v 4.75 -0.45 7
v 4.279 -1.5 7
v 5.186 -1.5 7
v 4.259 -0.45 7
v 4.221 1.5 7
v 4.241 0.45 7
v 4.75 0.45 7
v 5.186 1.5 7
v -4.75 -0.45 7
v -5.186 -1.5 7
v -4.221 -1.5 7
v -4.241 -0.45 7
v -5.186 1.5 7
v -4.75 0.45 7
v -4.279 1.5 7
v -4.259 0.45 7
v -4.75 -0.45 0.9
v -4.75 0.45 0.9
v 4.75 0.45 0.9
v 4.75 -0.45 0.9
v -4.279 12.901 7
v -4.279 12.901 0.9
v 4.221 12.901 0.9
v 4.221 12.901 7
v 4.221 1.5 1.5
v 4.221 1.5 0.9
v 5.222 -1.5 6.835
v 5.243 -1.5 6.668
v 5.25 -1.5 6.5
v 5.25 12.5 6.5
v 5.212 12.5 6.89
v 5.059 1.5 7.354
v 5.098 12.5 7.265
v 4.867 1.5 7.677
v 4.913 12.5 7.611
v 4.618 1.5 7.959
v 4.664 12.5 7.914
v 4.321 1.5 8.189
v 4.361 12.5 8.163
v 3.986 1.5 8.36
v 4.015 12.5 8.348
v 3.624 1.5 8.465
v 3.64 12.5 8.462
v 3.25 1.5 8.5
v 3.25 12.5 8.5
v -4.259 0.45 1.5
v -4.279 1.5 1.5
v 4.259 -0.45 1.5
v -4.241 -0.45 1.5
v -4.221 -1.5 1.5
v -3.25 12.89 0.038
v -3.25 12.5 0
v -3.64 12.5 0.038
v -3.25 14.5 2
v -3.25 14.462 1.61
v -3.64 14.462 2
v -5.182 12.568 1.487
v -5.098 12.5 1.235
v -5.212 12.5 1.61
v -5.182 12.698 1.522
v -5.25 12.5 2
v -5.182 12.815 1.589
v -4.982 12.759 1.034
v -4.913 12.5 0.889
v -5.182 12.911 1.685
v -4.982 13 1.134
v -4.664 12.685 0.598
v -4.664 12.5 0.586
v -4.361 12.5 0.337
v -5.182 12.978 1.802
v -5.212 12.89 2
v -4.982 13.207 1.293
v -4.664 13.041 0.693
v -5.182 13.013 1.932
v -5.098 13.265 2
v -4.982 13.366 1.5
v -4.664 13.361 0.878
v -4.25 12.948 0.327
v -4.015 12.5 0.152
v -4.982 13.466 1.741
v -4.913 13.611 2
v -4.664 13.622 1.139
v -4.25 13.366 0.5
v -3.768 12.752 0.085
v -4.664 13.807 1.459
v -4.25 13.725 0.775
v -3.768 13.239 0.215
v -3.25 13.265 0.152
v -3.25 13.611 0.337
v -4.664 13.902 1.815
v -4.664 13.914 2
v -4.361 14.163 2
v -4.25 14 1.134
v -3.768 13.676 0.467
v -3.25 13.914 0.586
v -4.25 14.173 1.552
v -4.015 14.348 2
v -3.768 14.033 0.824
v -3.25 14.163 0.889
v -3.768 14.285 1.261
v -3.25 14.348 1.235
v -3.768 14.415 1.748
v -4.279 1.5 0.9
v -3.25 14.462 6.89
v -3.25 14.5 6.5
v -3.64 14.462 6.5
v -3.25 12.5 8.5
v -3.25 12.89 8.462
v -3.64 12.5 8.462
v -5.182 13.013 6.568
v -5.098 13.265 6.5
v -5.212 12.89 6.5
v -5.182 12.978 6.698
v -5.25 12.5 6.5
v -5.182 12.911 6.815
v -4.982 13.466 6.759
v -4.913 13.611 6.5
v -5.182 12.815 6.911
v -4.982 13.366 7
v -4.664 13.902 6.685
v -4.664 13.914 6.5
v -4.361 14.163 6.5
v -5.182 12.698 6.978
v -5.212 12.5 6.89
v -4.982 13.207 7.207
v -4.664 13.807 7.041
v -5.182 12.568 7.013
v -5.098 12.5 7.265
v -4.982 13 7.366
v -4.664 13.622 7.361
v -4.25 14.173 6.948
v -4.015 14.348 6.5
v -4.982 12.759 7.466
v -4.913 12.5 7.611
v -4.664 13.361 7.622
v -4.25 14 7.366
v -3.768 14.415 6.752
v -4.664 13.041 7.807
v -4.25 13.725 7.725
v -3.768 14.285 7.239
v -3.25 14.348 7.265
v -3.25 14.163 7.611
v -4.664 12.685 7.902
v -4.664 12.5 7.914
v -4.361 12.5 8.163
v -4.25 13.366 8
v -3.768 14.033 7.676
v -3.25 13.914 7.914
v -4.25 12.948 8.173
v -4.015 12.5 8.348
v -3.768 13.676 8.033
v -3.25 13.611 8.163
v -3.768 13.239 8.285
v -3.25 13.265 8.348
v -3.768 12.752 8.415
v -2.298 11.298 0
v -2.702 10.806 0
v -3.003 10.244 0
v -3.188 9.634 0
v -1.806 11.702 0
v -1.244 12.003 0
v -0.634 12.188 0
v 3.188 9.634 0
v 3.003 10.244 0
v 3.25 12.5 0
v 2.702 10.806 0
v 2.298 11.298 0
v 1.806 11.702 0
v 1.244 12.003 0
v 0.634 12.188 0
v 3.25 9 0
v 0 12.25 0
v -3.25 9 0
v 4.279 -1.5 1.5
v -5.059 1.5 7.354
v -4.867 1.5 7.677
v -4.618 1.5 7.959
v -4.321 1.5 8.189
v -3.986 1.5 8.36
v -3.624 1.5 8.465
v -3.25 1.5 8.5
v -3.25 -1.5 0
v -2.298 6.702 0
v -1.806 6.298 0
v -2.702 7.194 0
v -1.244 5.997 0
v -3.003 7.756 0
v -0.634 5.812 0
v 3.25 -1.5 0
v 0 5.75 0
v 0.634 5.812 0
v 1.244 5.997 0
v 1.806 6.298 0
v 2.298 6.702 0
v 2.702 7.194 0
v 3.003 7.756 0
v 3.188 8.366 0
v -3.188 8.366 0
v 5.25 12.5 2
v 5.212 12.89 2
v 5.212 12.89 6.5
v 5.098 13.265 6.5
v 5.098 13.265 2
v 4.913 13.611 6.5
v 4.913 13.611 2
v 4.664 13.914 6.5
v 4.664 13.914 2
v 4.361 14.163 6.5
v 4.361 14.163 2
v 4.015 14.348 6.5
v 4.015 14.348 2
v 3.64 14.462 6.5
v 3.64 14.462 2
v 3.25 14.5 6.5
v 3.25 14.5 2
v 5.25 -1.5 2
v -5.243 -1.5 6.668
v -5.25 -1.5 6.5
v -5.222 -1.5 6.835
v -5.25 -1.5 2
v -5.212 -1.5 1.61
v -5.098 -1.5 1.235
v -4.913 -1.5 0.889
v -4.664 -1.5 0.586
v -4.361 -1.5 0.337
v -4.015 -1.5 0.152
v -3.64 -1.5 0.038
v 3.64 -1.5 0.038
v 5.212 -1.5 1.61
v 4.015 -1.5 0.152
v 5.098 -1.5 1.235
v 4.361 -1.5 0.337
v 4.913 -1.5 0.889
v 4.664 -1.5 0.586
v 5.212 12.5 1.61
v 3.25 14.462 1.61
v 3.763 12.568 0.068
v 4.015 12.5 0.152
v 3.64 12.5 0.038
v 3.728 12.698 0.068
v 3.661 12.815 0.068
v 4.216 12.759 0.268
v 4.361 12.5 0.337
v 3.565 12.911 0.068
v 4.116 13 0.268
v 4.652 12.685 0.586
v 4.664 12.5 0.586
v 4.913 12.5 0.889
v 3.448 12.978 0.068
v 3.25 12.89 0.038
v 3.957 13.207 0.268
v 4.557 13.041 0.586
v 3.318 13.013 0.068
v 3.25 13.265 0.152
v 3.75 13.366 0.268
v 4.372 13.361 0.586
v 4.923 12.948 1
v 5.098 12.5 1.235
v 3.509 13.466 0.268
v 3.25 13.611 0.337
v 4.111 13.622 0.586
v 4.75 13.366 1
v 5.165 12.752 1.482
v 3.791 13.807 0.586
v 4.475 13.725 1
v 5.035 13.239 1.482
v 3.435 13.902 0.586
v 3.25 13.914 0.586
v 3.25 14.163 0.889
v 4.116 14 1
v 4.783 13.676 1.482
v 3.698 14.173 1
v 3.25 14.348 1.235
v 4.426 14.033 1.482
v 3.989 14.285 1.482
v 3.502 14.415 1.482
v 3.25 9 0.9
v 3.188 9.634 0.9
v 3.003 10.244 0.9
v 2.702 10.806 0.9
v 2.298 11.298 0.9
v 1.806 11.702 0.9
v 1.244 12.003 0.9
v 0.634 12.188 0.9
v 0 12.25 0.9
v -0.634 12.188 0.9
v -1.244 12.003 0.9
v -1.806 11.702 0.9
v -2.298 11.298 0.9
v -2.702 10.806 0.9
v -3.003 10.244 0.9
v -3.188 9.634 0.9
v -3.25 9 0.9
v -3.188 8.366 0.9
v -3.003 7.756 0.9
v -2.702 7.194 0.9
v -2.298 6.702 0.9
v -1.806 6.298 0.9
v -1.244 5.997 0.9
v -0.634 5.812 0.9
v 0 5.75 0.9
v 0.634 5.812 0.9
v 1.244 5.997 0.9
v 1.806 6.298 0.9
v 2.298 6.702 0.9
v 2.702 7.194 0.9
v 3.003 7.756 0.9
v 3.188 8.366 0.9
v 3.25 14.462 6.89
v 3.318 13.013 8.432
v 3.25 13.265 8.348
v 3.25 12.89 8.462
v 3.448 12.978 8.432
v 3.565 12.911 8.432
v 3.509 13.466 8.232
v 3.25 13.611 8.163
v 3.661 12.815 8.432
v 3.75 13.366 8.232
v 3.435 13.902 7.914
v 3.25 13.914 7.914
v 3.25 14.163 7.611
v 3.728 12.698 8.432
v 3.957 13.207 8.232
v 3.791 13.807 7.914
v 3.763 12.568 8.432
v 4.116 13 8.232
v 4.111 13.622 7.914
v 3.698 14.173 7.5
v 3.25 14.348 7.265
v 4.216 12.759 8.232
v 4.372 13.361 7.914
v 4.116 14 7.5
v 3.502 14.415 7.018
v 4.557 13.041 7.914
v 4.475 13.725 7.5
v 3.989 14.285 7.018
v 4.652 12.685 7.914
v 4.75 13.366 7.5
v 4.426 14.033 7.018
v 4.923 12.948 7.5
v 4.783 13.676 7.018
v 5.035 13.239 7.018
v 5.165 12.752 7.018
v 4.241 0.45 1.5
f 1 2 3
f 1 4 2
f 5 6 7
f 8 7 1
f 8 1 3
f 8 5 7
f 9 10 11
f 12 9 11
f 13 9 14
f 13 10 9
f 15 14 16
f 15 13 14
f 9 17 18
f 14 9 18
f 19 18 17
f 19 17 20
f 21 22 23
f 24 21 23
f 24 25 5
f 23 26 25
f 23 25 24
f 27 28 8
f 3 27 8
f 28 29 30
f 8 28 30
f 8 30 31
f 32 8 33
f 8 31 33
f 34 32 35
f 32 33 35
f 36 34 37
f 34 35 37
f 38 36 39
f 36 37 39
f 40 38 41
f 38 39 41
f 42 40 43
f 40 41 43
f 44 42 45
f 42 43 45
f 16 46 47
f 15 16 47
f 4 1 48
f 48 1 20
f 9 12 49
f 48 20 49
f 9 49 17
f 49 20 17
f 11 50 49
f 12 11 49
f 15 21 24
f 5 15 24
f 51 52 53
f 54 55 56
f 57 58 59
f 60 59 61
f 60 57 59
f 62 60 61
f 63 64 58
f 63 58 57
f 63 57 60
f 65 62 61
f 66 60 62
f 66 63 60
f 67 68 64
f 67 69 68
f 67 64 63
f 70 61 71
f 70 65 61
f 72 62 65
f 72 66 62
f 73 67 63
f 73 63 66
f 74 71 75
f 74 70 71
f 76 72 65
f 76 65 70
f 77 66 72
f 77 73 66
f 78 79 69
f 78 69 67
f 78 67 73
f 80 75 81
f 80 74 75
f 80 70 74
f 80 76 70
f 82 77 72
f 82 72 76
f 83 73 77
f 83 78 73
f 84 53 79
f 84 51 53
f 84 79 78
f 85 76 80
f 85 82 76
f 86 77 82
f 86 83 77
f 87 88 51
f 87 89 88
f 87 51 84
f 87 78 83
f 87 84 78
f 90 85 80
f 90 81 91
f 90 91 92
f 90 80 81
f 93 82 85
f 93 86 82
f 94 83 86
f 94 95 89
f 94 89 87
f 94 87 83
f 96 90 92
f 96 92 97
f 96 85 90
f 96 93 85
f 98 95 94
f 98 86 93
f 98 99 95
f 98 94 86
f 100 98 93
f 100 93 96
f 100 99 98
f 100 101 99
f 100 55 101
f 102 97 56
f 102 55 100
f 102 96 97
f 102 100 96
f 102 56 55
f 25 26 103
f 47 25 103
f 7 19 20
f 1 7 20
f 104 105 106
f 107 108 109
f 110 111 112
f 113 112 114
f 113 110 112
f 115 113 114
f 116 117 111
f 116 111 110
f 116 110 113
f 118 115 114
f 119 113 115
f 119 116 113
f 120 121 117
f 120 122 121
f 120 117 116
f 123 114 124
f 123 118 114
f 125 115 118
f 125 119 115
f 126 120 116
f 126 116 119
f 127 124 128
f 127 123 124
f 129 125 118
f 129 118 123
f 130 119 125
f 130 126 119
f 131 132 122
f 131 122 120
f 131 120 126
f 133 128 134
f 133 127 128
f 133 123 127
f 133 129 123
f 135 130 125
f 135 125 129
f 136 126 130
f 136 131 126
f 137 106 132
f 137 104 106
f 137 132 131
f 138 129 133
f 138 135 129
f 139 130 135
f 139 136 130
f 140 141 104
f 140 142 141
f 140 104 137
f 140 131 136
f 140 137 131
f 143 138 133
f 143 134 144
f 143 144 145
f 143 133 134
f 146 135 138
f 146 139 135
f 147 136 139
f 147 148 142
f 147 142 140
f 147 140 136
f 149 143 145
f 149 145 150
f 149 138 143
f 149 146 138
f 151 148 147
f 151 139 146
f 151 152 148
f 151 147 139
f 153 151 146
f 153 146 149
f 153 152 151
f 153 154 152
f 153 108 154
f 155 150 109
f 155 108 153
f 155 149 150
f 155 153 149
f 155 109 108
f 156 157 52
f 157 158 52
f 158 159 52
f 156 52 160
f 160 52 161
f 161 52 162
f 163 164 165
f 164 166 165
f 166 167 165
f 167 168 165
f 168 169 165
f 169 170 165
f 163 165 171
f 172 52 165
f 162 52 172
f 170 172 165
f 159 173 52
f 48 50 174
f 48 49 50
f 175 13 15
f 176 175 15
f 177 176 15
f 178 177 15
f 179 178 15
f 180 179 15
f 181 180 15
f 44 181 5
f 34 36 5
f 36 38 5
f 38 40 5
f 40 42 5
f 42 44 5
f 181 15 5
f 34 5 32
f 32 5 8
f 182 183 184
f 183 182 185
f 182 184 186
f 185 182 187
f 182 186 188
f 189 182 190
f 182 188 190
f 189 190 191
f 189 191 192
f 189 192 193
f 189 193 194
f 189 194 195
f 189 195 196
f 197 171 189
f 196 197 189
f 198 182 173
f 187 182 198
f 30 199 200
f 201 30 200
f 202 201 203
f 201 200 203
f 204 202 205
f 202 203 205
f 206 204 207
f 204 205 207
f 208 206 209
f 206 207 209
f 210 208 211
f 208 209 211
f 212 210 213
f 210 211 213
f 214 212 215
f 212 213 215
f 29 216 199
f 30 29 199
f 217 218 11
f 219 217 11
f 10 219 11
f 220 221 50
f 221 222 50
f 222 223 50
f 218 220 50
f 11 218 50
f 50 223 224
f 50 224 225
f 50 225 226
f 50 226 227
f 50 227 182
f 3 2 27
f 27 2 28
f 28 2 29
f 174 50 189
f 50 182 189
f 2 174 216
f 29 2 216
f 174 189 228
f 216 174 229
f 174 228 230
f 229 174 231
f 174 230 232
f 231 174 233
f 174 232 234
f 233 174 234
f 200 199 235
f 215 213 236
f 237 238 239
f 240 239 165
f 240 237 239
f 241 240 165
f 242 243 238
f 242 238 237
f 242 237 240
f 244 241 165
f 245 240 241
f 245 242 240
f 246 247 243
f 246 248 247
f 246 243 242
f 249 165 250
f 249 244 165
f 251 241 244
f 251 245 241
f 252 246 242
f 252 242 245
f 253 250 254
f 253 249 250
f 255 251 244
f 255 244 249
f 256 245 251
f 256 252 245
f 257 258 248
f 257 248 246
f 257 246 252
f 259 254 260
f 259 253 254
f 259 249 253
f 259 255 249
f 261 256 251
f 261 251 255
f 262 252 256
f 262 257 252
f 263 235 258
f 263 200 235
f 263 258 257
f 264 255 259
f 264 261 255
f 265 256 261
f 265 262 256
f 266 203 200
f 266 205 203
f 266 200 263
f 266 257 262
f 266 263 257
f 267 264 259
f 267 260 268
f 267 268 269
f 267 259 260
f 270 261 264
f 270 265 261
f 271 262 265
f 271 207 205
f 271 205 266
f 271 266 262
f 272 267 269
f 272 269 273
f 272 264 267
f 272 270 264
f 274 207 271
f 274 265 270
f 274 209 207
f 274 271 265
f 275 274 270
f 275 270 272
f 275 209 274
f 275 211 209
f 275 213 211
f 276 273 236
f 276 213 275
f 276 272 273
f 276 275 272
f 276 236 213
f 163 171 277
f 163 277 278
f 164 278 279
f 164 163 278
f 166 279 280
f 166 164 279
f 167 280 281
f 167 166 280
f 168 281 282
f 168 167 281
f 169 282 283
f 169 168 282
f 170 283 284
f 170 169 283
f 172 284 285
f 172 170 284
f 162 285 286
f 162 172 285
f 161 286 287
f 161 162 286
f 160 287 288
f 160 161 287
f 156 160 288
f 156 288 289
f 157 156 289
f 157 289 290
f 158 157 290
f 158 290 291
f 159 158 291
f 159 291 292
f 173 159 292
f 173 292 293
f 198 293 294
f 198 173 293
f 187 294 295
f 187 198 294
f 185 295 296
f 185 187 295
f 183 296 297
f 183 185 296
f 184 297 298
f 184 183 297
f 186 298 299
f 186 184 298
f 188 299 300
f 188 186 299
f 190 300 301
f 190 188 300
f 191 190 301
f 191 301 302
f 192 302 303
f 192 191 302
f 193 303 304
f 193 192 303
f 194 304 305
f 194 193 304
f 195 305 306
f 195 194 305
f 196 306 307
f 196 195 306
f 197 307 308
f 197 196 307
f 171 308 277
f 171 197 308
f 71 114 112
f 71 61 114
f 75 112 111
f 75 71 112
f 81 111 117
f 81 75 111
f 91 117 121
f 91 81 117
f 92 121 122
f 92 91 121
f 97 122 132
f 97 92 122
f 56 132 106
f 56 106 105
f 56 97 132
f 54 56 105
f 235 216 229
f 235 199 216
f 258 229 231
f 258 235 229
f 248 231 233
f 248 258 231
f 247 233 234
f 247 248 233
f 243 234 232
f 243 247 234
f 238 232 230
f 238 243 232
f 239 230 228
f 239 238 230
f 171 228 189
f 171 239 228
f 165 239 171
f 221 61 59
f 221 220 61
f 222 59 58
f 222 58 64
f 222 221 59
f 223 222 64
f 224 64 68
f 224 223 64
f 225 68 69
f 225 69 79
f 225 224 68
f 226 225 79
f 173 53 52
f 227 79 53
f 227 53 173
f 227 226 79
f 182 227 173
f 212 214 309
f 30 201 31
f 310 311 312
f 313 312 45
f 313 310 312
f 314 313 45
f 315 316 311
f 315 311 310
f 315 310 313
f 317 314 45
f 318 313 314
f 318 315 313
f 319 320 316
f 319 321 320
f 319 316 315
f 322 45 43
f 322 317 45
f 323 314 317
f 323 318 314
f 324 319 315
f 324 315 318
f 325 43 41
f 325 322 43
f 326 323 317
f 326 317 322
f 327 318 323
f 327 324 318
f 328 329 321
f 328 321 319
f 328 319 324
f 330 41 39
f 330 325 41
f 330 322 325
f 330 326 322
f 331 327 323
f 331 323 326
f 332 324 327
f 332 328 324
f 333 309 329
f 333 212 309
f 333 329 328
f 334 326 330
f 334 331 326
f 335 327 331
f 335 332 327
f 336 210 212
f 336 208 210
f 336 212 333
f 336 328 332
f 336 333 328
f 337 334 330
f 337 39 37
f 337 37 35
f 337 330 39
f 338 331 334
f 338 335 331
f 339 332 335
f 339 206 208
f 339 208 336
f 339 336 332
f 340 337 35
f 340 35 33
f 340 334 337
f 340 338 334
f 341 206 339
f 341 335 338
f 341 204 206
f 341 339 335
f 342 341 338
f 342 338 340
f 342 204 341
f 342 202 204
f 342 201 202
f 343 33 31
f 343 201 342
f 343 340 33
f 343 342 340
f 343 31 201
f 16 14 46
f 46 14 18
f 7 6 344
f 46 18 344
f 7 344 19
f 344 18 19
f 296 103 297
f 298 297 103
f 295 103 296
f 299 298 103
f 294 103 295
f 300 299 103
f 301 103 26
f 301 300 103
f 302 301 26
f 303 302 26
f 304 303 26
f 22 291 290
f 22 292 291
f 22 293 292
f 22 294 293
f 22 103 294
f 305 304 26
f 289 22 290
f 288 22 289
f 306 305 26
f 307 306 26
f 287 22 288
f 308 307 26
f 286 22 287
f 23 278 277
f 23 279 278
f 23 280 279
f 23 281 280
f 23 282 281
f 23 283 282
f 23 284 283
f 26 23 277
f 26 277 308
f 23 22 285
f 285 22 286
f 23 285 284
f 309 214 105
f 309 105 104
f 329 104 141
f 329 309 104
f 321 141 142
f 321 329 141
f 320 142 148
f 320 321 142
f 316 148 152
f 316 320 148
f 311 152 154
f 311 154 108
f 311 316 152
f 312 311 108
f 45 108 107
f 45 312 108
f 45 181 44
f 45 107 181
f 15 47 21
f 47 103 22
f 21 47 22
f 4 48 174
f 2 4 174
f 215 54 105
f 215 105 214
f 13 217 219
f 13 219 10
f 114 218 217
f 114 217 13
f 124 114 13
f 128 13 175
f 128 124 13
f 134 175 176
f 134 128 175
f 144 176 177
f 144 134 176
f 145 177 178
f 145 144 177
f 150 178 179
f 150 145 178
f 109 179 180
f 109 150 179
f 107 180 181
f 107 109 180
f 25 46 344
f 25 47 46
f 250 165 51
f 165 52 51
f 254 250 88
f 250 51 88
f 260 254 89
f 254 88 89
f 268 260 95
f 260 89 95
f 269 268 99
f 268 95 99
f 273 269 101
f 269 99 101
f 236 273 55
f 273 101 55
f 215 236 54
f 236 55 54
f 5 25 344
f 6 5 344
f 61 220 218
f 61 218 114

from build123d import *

# Parameters (mm, degrees)
F0_W     = 8.5
F0_H     = 11.400557369
F0_W_2   = 0.9711329822
F0_H_2   = 1.599442631
F0_W_3   = 1.0288670178
F1_DEPTH = 0.9
F2_DEPTH = 1.5
F3_DEPTH = 7
F5_W     = 10.5
F5_H     = 13
F6_DEPTH = 1.5
F7_R     = 2
F9_DEPTH = 0.9


# Not quite as in the source:
# - a feature names something its author has since deleted; it is built from what else it names


with BuildPart() as f1:
    # F0 (on Top) → F1 (new body)
    with BuildSketch(Plane.XY):
        with Locations((-0.0288670178, 7.2002786845)):
            Rectangle(F0_W, F0_H)
        Polygon((-5.25, 1.5), (-5.25, -1.5), (-4.2211329822, -1.5), (-4.2413398946, -0.45), (-4.75, -0.45), (-4.75, 0.45), (-4.2586601054, 0.45), (-4.2788670178, 1.5), align=None)
        Polygon((4.2211329822, 1.5), (-4.2788670178, 1.5), (-4.2586601054, 0.45), (4.2413398946, 0.45), align=None)
        with Locations((-4.7644335089, 7.2002786845)):
            Rectangle(F0_W_2, F0_H)
        Polygon((4.2586601054, -0.45), (4.2788670178, -1.5), (5.25, -1.5), (5.25, 1.5), (4.2211329822, 1.5), (4.2413398946, 0.45), (4.75, 0.45), (4.75, -0.45), align=None)
        Polygon((-4.2413398946, -0.45), (-4.2211329822, -1.5), (4.2788670178, -1.5), (4.2586601054, -0.45), align=None)
        Polygon((-4.2586601054, 0.45), (-4.2413398946, -0.45), (4.2586601054, -0.45), (4.2413398946, 0.45), align=None)
        Polygon((-4.75, -0.45), (-4.2413398946, -0.45), (-4.2586601054, 0.45), (-4.75, 0.45), align=None)
        Polygon((4.2413398946, 0.45), (4.2586601054, -0.45), (4.75, -0.45), (4.75, 0.45), align=None)
        with Locations((-4.7644335089, 13.7002786845)):
            Rectangle(F0_W_2, F0_H_2)
        with Locations((-0.0288670178, 13.7002786845)):
            Rectangle(F0_W, F0_H_2)
        with Locations((4.7355664911, 13.7002786845)):
            Rectangle(F0_W_3, F0_H_2)
        with Locations((4.7355664911, 7.2002786845)):
            Rectangle(F0_W_3, F0_H)
    extrude(amount=F1_DEPTH)

    # F0 (on Top) → F2 (join)
    with BuildSketch(Plane.XY):
        Polygon((-4.2413398946, -0.45), (-4.2211329822, -1.5), (4.2788670178, -1.5), (4.2586601054, -0.45), align=None)
        Polygon((-5.25, 1.5), (-5.25, -1.5), (-4.2211329822, -1.5), (-4.2413398946, -0.45), (-4.75, -0.45), (-4.75, 0.45), (-4.2586601054, 0.45), (-4.2788670178, 1.5), align=None)
        Polygon((4.2586601054, -0.45), (4.2788670178, -1.5), (5.25, -1.5), (5.25, 1.5), (4.2211329822, 1.5), (4.2413398946, 0.45), (4.75, 0.45), (4.75, -0.45), align=None)
        Polygon((4.2211329822, 1.5), (-4.2788670178, 1.5), (-4.2586601054, 0.45), (4.2413398946, 0.45), align=None)
        with Locations((-4.7644335089, 7.2002786845)):
            Rectangle(F0_W_2, F0_H)
        with Locations((-4.7644335089, 13.7002786845)):
            Rectangle(F0_W_2, F0_H_2)
        with Locations((-0.0288670178, 13.7002786845)):
            Rectangle(F0_W, F0_H_2)
        with Locations((4.7355664911, 13.7002786845)):
            Rectangle(F0_W_3, F0_H_2)
        with Locations((4.7355664911, 7.2002786845)):
            Rectangle(F0_W_3, F0_H)
    extrude(amount=F2_DEPTH)

    # F0 (on Top) → F3 (join)
    with BuildSketch(Plane.XY):
        Polygon((-5.25, 1.5), (-5.25, -1.5), (-4.2211329822, -1.5), (-4.2413398946, -0.45), (-4.75, -0.45), (-4.75, 0.45), (-4.2586601054, 0.45), (-4.2788670178, 1.5), align=None)
        Polygon((4.2586601054, -0.45), (4.2788670178, -1.5), (5.25, -1.5), (5.25, 1.5), (4.2211329822, 1.5), (4.2413398946, 0.45), (4.75, 0.45), (4.75, -0.45), align=None)
        with Locations((-4.7644335089, 13.7002786845)):
            Rectangle(F0_W_2, F0_H_2)
        with Locations((-0.0288670178, 13.7002786845)):
            Rectangle(F0_W, F0_H_2)
        with Locations((4.7355664911, 13.7002786845)):
            Rectangle(F0_W_3, F0_H_2)
        with Locations((-4.7644335089, 7.2002786845)):
            Rectangle(F0_W_2, F0_H)
        with Locations((4.7355664911, 7.2002786845)):
            Rectangle(F0_W_3, F0_H)
    extrude(amount=F3_DEPTH)

    # F5 (on offset) → F6 (join)
    with BuildSketch(Plane.XY.offset(7)):
        with Locations((0, 8)):
            Rectangle(F5_W, F5_H)
    extrude(amount=F6_DEPTH)

    # F7
    f7_edges = [f1.edges().sort_by_distance(p)[0] for p in [
        (5.25, 14.5, 4.25),
        (0, 14.5, 8.5),
        (5.25, 8, 8.5),
        (5.25, 6.5, 0),
        (0, 14.5, 0),
        (-5.25, 6.5, 0),
        (-5.25, 14.5, 4.25),
        (-5.25, 8, 8.5),
    ]]
    fillet(f7_edges, radius=F7_R)

    # F8 (on Top) → F9 (cut, through all)
    with BuildSketch(Plane.XY):
        with BuildLine():
            ThreePointArc((0, 5.75), (2.2980970389, 6.7019029611), (3.25, 9))
            ThreePointArc((3.25, 9), (-2.2980970389, 11.2980970389), (0, 5.75))
        make_face()
    extrude(amount=F9_DEPTH, mode=Mode.SUBTRACT)


solid = f1.part
